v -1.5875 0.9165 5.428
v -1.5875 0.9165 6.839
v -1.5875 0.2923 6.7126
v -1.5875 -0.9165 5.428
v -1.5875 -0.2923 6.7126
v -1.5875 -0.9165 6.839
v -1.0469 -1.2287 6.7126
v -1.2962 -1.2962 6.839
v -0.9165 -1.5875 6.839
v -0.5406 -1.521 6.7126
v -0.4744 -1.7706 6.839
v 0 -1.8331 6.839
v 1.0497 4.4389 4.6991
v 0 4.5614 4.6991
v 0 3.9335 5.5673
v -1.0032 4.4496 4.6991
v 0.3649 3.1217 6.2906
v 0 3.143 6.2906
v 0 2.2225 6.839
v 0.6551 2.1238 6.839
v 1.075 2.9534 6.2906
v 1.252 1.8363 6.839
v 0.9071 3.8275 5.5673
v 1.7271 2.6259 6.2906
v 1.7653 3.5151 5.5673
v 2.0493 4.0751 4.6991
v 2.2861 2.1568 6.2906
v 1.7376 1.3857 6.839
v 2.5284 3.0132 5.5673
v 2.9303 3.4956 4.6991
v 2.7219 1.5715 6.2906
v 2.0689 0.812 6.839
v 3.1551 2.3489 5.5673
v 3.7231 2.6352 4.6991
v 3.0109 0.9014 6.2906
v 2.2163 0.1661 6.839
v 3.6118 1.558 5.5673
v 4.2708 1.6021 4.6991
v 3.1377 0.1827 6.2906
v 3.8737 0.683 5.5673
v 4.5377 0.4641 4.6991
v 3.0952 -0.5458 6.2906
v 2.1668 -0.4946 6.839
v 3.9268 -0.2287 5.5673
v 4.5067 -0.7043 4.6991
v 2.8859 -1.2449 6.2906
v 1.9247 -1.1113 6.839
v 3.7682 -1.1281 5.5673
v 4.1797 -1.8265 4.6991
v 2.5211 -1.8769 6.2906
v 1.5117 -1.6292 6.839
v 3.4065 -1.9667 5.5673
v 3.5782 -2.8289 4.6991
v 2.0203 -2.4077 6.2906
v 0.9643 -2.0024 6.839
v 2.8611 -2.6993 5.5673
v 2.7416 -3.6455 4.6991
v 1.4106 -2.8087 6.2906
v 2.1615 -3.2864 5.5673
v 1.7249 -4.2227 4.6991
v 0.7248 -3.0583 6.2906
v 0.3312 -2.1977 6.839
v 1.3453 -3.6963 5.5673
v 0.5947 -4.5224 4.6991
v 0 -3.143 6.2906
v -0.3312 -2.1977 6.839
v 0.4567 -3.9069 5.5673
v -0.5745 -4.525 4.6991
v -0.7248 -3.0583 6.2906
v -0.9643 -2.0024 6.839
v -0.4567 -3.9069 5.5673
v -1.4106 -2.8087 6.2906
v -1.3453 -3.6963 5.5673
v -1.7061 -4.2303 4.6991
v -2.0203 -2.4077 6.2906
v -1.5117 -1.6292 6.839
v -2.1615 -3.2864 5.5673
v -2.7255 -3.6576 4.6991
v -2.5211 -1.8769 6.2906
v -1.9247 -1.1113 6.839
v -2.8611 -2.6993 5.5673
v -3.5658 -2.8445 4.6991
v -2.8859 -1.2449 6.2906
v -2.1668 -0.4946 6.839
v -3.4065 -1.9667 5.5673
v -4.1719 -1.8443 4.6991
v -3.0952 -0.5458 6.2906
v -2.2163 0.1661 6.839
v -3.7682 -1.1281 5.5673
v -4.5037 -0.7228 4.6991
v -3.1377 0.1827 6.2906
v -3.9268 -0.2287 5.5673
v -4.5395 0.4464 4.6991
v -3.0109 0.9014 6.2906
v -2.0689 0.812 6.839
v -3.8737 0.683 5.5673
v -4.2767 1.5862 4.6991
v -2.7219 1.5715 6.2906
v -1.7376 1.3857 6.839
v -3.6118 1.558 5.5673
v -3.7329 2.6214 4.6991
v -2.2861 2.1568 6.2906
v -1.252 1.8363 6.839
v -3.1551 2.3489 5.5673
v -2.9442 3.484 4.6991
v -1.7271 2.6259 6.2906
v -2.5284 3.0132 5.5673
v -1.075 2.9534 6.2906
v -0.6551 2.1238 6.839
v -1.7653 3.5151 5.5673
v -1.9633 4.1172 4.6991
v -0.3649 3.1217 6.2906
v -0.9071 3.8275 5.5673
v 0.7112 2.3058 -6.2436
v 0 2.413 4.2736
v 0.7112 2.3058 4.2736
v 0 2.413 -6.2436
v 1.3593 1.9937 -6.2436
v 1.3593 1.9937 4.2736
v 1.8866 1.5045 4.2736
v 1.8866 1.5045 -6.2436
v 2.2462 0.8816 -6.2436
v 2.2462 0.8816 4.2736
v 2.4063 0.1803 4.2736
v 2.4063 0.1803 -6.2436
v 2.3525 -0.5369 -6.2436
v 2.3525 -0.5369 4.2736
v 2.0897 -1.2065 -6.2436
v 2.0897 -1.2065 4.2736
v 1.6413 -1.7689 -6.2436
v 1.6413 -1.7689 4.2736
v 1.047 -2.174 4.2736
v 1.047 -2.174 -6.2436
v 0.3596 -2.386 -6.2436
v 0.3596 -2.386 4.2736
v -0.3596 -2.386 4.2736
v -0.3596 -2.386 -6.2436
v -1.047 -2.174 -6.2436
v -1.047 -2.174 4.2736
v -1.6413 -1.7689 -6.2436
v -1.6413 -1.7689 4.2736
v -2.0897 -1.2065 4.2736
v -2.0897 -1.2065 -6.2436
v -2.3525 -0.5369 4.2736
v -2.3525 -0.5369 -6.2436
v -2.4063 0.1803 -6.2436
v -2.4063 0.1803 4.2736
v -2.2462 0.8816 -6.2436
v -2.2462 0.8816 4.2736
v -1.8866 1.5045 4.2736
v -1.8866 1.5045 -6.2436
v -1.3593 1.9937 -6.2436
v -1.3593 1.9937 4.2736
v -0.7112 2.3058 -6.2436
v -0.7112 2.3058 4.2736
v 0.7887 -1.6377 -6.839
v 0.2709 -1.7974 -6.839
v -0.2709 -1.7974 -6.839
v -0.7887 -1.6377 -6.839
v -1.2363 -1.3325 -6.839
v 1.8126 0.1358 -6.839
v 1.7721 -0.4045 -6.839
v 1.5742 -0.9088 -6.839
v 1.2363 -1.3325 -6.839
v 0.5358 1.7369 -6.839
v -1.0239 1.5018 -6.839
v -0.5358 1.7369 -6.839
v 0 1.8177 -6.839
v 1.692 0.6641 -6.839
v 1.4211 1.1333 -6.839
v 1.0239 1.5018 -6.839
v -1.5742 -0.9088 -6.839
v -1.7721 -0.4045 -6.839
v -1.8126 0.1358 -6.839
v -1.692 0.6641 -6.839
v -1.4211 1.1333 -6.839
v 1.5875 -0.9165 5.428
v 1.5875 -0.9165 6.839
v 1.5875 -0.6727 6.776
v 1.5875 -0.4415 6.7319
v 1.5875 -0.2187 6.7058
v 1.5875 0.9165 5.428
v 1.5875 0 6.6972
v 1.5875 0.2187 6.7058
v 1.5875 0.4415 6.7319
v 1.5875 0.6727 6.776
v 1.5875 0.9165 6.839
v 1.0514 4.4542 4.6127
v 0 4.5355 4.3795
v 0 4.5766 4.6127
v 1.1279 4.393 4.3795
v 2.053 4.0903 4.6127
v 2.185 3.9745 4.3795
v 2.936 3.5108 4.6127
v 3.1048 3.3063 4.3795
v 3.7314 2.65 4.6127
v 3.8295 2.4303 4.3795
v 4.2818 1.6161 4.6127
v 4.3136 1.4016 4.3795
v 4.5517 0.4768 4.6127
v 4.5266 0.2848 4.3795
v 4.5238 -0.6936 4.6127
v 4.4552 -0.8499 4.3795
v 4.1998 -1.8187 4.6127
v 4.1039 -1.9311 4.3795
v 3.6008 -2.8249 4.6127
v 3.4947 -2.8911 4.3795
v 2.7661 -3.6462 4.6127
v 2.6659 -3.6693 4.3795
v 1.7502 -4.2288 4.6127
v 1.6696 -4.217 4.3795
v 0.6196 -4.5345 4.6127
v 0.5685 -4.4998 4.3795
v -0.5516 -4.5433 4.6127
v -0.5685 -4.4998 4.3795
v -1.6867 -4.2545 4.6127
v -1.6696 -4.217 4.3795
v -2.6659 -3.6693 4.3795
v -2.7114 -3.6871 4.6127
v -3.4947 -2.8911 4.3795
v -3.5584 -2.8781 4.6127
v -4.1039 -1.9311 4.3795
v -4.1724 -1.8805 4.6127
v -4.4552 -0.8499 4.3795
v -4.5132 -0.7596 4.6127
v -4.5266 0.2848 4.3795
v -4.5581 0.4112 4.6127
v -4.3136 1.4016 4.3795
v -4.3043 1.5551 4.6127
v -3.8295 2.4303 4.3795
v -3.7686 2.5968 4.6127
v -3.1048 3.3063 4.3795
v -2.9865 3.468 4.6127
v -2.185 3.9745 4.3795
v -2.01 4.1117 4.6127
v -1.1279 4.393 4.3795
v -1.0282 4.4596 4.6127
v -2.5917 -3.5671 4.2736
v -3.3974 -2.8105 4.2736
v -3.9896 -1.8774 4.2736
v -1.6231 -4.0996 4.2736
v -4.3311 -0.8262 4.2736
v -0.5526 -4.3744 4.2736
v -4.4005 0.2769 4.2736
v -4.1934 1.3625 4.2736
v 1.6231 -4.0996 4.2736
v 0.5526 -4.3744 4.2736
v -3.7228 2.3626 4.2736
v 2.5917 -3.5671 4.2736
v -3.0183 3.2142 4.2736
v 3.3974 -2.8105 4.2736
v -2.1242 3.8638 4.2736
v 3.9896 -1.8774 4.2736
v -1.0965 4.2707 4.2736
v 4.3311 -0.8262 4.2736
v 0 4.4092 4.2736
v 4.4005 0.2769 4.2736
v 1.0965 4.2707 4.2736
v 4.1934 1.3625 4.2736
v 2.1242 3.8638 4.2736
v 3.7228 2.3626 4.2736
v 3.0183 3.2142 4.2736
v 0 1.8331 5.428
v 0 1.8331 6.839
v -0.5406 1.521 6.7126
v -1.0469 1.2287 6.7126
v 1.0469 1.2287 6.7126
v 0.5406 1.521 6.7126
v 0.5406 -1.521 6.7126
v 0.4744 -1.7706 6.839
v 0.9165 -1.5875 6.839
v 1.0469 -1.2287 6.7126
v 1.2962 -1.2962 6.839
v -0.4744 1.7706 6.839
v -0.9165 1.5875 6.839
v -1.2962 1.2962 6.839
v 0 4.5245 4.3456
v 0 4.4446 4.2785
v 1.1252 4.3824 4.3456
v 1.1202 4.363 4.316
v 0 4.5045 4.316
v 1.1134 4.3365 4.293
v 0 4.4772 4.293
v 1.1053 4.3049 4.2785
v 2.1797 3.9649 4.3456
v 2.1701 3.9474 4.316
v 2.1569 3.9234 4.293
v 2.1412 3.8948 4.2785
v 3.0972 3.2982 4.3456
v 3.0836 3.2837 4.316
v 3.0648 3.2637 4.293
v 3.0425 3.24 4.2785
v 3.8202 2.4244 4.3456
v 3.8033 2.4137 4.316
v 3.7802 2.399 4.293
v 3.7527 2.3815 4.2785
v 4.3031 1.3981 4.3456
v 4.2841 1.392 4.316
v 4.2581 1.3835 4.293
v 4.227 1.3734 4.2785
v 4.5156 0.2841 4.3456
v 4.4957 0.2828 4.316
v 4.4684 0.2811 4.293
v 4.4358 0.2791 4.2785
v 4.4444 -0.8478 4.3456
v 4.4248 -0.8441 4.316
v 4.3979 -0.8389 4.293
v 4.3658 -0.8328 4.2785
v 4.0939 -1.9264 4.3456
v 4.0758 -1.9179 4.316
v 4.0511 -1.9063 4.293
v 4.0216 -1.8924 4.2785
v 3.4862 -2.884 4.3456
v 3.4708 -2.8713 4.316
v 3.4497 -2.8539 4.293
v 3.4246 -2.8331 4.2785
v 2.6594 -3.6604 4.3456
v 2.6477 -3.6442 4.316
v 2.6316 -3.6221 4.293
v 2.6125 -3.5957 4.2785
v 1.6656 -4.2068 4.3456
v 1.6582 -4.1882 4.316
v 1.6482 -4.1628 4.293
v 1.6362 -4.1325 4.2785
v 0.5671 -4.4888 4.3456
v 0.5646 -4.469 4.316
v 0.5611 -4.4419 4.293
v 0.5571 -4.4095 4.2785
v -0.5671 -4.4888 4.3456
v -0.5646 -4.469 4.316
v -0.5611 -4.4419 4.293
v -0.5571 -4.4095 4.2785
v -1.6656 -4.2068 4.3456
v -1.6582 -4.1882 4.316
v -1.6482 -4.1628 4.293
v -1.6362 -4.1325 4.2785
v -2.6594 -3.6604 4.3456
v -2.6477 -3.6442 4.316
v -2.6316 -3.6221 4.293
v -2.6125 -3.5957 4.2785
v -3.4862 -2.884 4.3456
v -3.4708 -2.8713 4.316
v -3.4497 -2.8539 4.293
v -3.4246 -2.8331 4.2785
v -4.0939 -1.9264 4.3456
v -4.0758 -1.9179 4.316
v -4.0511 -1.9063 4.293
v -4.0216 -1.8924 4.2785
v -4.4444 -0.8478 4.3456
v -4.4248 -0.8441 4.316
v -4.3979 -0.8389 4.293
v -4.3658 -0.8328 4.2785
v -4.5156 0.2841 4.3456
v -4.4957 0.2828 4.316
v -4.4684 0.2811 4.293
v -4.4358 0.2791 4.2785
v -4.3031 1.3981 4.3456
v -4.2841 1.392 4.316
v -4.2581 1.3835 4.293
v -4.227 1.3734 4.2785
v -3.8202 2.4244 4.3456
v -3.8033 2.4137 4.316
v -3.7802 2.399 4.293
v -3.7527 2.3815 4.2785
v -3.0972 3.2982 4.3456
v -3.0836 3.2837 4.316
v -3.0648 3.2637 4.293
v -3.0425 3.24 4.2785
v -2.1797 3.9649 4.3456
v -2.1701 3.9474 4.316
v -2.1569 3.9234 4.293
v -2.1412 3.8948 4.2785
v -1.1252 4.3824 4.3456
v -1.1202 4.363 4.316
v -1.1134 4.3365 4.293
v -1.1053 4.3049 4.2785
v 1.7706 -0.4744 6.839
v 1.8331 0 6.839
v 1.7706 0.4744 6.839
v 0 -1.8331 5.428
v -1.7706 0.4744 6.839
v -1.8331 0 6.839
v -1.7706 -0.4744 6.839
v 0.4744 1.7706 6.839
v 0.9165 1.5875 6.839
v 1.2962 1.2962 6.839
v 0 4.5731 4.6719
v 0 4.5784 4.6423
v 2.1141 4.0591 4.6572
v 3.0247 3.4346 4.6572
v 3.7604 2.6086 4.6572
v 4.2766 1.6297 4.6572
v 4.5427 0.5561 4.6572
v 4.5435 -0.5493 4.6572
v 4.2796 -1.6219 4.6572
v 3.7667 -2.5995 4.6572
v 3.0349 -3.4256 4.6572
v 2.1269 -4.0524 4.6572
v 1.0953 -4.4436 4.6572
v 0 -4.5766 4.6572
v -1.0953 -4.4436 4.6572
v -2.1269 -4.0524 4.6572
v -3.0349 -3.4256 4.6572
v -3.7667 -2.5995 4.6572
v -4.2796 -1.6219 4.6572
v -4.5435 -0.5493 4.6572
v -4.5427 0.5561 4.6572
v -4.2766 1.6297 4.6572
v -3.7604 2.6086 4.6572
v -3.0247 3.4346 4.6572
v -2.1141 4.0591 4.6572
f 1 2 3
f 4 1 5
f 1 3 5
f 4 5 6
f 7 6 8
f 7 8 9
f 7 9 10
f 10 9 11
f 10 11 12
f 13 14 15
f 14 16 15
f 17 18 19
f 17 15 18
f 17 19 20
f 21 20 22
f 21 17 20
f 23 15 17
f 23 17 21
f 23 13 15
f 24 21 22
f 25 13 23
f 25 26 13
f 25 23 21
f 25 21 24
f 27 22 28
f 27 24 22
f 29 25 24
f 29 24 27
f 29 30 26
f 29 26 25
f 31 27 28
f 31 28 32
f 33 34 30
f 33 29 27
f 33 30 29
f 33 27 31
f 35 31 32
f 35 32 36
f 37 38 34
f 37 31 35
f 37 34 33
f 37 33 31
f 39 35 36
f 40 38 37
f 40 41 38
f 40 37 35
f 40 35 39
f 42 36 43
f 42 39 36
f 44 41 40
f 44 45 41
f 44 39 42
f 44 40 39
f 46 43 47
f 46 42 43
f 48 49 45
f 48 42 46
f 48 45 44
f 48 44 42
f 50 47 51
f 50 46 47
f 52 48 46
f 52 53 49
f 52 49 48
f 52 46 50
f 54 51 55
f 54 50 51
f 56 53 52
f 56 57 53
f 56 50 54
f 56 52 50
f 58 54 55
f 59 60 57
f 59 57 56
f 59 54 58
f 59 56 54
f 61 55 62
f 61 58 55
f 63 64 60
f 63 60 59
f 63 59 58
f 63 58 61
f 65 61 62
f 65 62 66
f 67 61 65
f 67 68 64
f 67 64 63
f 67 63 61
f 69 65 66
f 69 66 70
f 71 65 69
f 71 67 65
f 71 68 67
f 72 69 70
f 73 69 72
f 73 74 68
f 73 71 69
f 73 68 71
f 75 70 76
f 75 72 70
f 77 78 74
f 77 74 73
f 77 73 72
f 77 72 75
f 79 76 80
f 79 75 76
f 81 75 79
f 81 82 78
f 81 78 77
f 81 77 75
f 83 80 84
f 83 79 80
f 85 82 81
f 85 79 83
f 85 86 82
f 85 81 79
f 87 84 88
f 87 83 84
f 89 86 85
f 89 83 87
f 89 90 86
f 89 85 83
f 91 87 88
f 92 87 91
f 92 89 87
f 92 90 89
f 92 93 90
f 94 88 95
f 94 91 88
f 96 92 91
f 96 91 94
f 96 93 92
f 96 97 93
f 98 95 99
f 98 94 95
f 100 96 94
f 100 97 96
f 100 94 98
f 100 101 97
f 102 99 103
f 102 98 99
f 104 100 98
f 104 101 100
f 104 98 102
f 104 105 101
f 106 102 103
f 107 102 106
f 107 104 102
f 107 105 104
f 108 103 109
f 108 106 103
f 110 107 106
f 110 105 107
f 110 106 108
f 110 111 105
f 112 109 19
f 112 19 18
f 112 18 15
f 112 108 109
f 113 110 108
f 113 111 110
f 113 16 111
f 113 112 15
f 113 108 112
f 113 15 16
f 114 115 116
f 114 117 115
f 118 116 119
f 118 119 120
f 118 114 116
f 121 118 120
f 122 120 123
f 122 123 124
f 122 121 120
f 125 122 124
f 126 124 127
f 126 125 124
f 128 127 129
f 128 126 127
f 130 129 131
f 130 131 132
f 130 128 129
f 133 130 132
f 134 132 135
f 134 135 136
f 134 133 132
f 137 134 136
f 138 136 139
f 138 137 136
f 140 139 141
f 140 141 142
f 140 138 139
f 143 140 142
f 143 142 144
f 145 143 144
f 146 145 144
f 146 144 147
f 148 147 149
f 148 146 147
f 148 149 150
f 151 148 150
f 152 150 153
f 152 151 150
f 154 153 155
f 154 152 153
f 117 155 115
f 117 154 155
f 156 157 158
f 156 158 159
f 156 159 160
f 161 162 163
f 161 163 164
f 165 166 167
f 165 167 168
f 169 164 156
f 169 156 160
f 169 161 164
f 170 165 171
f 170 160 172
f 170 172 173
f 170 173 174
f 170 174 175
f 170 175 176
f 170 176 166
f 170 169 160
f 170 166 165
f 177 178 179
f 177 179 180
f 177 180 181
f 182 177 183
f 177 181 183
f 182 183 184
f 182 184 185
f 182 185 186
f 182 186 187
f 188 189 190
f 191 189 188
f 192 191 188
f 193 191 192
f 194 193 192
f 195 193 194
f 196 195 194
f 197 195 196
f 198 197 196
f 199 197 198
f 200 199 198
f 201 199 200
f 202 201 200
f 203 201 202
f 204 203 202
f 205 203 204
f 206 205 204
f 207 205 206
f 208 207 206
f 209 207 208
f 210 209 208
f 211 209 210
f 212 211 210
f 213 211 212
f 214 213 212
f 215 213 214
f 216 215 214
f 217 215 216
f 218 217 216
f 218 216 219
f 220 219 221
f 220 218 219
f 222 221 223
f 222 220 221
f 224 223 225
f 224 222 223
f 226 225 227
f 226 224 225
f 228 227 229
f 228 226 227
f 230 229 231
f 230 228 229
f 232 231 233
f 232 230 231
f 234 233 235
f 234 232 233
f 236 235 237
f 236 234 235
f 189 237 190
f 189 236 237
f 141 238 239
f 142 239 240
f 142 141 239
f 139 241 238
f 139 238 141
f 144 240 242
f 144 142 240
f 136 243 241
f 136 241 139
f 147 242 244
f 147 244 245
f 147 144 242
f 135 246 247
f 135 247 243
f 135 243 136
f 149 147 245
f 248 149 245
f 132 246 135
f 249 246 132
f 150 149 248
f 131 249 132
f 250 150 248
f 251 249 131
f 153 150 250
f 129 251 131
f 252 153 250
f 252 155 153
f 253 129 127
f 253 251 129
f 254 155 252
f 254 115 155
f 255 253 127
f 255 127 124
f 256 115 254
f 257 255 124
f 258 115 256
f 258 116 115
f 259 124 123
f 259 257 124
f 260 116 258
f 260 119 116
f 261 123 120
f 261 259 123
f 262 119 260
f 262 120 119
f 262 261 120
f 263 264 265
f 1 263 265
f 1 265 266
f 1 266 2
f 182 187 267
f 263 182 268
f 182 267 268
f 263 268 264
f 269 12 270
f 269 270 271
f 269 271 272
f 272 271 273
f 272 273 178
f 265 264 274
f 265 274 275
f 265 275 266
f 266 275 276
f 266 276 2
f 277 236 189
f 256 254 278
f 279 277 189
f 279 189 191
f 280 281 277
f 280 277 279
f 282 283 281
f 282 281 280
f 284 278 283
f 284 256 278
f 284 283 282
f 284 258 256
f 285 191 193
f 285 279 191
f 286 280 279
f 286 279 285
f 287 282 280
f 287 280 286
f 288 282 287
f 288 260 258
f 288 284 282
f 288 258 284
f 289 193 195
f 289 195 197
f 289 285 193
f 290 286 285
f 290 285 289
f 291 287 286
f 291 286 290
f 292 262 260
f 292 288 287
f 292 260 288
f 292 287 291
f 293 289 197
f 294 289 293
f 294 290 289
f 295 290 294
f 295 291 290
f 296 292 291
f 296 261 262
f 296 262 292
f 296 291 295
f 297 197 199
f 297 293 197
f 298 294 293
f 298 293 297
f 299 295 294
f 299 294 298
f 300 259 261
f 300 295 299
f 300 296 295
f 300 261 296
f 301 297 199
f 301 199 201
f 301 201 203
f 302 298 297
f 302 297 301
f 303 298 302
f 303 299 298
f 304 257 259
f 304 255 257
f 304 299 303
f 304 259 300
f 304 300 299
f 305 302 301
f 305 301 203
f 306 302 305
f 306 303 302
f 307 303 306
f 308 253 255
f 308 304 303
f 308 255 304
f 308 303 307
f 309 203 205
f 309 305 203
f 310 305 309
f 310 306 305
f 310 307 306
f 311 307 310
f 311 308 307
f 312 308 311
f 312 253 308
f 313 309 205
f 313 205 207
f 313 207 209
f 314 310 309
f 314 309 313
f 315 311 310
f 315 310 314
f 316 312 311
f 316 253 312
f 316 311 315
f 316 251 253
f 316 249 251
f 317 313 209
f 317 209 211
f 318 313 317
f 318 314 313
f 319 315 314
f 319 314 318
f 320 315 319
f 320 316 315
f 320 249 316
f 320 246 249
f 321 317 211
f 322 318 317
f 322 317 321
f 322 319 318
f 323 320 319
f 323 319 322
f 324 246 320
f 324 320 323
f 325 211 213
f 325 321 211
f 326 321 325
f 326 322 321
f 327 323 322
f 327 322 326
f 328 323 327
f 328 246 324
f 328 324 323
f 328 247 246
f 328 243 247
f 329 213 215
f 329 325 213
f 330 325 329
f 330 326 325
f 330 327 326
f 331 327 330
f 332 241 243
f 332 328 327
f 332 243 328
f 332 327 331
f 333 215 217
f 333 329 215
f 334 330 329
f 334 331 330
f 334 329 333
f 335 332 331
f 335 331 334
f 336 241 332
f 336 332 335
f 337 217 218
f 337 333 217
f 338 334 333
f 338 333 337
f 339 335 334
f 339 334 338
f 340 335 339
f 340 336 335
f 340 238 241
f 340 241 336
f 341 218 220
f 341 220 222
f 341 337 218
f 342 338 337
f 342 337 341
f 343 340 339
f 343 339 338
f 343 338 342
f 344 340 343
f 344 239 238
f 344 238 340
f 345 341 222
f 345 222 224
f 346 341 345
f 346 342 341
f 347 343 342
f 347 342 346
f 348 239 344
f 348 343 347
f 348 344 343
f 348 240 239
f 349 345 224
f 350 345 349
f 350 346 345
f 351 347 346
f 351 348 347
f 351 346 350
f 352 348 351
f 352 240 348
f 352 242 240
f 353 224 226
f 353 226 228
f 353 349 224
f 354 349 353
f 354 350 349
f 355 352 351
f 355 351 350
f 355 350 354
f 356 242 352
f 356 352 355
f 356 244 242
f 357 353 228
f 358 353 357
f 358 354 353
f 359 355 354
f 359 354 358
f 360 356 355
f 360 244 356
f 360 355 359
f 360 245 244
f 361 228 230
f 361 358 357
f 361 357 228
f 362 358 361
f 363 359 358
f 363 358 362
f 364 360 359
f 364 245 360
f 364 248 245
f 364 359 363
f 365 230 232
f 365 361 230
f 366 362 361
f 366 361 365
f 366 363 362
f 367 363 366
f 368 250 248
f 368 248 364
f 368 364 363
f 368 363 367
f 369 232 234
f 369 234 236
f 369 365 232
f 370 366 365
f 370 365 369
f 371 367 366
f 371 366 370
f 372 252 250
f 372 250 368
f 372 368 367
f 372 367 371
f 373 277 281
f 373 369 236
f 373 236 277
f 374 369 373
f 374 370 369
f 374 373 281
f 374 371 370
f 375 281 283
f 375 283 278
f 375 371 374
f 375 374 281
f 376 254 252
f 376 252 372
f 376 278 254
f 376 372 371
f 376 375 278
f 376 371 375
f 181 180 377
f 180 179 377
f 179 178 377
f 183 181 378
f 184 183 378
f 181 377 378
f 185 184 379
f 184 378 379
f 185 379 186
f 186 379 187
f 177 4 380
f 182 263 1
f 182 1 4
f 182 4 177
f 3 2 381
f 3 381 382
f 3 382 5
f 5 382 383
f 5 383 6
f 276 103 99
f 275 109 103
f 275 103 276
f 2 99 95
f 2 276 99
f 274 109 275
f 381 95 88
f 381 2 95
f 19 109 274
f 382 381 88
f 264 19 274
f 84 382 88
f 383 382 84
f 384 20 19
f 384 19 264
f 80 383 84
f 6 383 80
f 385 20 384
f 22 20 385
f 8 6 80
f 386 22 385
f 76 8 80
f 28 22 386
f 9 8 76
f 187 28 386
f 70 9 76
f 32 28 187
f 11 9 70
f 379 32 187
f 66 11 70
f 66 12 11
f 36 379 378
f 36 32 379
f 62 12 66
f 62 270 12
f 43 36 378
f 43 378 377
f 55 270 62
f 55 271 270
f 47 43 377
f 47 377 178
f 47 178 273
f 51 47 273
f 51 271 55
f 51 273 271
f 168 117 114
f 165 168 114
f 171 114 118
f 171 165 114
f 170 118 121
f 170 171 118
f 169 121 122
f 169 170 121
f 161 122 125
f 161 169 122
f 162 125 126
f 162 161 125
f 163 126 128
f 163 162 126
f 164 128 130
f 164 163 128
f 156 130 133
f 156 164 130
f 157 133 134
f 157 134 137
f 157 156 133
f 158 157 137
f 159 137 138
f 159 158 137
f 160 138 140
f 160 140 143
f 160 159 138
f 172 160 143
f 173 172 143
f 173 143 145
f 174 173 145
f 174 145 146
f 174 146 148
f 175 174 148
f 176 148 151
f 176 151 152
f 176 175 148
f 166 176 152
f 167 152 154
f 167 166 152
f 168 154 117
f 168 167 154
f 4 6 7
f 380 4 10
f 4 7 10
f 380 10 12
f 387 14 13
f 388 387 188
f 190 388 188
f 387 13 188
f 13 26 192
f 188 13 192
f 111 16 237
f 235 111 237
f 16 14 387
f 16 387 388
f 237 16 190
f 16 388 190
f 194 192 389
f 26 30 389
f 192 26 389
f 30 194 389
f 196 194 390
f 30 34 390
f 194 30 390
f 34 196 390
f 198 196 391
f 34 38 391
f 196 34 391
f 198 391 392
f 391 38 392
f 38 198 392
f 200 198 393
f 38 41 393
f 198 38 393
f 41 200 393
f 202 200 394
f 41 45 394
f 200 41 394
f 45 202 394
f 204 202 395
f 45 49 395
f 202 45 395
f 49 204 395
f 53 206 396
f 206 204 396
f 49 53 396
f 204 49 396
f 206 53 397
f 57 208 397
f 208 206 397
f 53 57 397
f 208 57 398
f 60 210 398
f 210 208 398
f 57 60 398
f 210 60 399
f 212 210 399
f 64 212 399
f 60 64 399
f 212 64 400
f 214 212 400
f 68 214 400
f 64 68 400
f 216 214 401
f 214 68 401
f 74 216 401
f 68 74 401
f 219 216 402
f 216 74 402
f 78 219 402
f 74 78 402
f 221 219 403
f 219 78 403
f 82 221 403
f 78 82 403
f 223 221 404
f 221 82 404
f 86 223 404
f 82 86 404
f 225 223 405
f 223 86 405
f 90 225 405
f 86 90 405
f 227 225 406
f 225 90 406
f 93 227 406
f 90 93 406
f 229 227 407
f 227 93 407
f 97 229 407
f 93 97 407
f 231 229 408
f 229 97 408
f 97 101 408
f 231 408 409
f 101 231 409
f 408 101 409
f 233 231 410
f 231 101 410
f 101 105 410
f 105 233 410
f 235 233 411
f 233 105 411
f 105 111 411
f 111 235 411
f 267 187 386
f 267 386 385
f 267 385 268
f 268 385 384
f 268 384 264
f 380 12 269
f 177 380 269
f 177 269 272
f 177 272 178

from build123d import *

# Parameters (mm, degrees)
CUT_EXTRUDE1_DEPTH = 1.41097
SKETCH5_R          = 1.833087105
CUT_EXTRUDE2_DEPTH = 1.41097
CUT_EXTRUDE2_DRAFT = -60
FILLET1_R          = 0.12827


with BuildPart() as part:
    # Sketch3 → Revolve1 (revolve)
    with BuildSketch(Plane(origin=(0, 0, 0), x_dir=(0, 0, -1), z_dir=(1, 0, 0))):
        with BuildLine():
            Line((-6.83895, 0), (-6.83895, 2.2225))
            ThreePointArc((-6.83895, 2.2225), (-5.93321038, 3.573966445), (-4.65836, 4.5847))
            Line((-4.65836, 4.5847), (-4.27355, 4.516847615))
            Line((-4.27355, 4.516847615), (-4.27355, 2.413))
            Line((-4.27355, 2.413), (6.2436375, 2.413))
            Line((6.2436375, 2.413), (6.83895, 1.8176875))
            Line((6.83895, 1.8176875), (6.83895, 0))
            Line((6.83895, 0), (-6.83895, 0))
        make_face()
    revolve(axis=Axis((0, 0, 6.83895), (0, 0, -1)))

    # Sketch4 → Cut-Extrude1 (cut)
    with BuildSketch(Plane.XY.offset(6.83895)):
        Polygon((-1.5875, -0.916543552), (0, -1.833087105), (1.5875, -0.916543552), (1.5875, 0.916543552), (0, 1.833087105), (-1.5875, 0.916543552), align=None)
    extrude(amount=-CUT_EXTRUDE1_DEPTH, mode=Mode.SUBTRACT)


with BuildPart() as cut_extrude2_tool:
    # Sketch5 → Cut-Extrude2 (with draft: the straight prism first)
    with BuildSketch(Plane.XY.offset(6.83895)):
        Circle(SKETCH5_R)
    extrude(amount=-CUT_EXTRUDE2_DEPTH)
    # Cut-Extrude2: the draft: its side faces are tilted about the plane it starts from
    cut_extrude2_sides = [cut_extrude2_tool.faces().sort_by_distance(p)[0] for p in [
        (-1.833087105, 0, 6.133465),
    ]]
    draft(cut_extrude2_sides, Plane.XY.offset(6.83895), CUT_EXTRUDE2_DRAFT)


with BuildPart() as part_1:
    add(part.part)

    # Cut-Extrude2: cut by cut_extrude2_tool
    add(cut_extrude2_tool.part, mode=Mode.SUBTRACT)

    # Fillet1
    fillet1_edges = [part_1.edges().sort_by_distance(p)[0] for p in [
        (0, -4.516847615, 4.27355),
        (0, -4.5847, 4.65836),
    ]]
    fillet(fillet1_edges, radius=FILLET1_R)


solid = part_1.part
